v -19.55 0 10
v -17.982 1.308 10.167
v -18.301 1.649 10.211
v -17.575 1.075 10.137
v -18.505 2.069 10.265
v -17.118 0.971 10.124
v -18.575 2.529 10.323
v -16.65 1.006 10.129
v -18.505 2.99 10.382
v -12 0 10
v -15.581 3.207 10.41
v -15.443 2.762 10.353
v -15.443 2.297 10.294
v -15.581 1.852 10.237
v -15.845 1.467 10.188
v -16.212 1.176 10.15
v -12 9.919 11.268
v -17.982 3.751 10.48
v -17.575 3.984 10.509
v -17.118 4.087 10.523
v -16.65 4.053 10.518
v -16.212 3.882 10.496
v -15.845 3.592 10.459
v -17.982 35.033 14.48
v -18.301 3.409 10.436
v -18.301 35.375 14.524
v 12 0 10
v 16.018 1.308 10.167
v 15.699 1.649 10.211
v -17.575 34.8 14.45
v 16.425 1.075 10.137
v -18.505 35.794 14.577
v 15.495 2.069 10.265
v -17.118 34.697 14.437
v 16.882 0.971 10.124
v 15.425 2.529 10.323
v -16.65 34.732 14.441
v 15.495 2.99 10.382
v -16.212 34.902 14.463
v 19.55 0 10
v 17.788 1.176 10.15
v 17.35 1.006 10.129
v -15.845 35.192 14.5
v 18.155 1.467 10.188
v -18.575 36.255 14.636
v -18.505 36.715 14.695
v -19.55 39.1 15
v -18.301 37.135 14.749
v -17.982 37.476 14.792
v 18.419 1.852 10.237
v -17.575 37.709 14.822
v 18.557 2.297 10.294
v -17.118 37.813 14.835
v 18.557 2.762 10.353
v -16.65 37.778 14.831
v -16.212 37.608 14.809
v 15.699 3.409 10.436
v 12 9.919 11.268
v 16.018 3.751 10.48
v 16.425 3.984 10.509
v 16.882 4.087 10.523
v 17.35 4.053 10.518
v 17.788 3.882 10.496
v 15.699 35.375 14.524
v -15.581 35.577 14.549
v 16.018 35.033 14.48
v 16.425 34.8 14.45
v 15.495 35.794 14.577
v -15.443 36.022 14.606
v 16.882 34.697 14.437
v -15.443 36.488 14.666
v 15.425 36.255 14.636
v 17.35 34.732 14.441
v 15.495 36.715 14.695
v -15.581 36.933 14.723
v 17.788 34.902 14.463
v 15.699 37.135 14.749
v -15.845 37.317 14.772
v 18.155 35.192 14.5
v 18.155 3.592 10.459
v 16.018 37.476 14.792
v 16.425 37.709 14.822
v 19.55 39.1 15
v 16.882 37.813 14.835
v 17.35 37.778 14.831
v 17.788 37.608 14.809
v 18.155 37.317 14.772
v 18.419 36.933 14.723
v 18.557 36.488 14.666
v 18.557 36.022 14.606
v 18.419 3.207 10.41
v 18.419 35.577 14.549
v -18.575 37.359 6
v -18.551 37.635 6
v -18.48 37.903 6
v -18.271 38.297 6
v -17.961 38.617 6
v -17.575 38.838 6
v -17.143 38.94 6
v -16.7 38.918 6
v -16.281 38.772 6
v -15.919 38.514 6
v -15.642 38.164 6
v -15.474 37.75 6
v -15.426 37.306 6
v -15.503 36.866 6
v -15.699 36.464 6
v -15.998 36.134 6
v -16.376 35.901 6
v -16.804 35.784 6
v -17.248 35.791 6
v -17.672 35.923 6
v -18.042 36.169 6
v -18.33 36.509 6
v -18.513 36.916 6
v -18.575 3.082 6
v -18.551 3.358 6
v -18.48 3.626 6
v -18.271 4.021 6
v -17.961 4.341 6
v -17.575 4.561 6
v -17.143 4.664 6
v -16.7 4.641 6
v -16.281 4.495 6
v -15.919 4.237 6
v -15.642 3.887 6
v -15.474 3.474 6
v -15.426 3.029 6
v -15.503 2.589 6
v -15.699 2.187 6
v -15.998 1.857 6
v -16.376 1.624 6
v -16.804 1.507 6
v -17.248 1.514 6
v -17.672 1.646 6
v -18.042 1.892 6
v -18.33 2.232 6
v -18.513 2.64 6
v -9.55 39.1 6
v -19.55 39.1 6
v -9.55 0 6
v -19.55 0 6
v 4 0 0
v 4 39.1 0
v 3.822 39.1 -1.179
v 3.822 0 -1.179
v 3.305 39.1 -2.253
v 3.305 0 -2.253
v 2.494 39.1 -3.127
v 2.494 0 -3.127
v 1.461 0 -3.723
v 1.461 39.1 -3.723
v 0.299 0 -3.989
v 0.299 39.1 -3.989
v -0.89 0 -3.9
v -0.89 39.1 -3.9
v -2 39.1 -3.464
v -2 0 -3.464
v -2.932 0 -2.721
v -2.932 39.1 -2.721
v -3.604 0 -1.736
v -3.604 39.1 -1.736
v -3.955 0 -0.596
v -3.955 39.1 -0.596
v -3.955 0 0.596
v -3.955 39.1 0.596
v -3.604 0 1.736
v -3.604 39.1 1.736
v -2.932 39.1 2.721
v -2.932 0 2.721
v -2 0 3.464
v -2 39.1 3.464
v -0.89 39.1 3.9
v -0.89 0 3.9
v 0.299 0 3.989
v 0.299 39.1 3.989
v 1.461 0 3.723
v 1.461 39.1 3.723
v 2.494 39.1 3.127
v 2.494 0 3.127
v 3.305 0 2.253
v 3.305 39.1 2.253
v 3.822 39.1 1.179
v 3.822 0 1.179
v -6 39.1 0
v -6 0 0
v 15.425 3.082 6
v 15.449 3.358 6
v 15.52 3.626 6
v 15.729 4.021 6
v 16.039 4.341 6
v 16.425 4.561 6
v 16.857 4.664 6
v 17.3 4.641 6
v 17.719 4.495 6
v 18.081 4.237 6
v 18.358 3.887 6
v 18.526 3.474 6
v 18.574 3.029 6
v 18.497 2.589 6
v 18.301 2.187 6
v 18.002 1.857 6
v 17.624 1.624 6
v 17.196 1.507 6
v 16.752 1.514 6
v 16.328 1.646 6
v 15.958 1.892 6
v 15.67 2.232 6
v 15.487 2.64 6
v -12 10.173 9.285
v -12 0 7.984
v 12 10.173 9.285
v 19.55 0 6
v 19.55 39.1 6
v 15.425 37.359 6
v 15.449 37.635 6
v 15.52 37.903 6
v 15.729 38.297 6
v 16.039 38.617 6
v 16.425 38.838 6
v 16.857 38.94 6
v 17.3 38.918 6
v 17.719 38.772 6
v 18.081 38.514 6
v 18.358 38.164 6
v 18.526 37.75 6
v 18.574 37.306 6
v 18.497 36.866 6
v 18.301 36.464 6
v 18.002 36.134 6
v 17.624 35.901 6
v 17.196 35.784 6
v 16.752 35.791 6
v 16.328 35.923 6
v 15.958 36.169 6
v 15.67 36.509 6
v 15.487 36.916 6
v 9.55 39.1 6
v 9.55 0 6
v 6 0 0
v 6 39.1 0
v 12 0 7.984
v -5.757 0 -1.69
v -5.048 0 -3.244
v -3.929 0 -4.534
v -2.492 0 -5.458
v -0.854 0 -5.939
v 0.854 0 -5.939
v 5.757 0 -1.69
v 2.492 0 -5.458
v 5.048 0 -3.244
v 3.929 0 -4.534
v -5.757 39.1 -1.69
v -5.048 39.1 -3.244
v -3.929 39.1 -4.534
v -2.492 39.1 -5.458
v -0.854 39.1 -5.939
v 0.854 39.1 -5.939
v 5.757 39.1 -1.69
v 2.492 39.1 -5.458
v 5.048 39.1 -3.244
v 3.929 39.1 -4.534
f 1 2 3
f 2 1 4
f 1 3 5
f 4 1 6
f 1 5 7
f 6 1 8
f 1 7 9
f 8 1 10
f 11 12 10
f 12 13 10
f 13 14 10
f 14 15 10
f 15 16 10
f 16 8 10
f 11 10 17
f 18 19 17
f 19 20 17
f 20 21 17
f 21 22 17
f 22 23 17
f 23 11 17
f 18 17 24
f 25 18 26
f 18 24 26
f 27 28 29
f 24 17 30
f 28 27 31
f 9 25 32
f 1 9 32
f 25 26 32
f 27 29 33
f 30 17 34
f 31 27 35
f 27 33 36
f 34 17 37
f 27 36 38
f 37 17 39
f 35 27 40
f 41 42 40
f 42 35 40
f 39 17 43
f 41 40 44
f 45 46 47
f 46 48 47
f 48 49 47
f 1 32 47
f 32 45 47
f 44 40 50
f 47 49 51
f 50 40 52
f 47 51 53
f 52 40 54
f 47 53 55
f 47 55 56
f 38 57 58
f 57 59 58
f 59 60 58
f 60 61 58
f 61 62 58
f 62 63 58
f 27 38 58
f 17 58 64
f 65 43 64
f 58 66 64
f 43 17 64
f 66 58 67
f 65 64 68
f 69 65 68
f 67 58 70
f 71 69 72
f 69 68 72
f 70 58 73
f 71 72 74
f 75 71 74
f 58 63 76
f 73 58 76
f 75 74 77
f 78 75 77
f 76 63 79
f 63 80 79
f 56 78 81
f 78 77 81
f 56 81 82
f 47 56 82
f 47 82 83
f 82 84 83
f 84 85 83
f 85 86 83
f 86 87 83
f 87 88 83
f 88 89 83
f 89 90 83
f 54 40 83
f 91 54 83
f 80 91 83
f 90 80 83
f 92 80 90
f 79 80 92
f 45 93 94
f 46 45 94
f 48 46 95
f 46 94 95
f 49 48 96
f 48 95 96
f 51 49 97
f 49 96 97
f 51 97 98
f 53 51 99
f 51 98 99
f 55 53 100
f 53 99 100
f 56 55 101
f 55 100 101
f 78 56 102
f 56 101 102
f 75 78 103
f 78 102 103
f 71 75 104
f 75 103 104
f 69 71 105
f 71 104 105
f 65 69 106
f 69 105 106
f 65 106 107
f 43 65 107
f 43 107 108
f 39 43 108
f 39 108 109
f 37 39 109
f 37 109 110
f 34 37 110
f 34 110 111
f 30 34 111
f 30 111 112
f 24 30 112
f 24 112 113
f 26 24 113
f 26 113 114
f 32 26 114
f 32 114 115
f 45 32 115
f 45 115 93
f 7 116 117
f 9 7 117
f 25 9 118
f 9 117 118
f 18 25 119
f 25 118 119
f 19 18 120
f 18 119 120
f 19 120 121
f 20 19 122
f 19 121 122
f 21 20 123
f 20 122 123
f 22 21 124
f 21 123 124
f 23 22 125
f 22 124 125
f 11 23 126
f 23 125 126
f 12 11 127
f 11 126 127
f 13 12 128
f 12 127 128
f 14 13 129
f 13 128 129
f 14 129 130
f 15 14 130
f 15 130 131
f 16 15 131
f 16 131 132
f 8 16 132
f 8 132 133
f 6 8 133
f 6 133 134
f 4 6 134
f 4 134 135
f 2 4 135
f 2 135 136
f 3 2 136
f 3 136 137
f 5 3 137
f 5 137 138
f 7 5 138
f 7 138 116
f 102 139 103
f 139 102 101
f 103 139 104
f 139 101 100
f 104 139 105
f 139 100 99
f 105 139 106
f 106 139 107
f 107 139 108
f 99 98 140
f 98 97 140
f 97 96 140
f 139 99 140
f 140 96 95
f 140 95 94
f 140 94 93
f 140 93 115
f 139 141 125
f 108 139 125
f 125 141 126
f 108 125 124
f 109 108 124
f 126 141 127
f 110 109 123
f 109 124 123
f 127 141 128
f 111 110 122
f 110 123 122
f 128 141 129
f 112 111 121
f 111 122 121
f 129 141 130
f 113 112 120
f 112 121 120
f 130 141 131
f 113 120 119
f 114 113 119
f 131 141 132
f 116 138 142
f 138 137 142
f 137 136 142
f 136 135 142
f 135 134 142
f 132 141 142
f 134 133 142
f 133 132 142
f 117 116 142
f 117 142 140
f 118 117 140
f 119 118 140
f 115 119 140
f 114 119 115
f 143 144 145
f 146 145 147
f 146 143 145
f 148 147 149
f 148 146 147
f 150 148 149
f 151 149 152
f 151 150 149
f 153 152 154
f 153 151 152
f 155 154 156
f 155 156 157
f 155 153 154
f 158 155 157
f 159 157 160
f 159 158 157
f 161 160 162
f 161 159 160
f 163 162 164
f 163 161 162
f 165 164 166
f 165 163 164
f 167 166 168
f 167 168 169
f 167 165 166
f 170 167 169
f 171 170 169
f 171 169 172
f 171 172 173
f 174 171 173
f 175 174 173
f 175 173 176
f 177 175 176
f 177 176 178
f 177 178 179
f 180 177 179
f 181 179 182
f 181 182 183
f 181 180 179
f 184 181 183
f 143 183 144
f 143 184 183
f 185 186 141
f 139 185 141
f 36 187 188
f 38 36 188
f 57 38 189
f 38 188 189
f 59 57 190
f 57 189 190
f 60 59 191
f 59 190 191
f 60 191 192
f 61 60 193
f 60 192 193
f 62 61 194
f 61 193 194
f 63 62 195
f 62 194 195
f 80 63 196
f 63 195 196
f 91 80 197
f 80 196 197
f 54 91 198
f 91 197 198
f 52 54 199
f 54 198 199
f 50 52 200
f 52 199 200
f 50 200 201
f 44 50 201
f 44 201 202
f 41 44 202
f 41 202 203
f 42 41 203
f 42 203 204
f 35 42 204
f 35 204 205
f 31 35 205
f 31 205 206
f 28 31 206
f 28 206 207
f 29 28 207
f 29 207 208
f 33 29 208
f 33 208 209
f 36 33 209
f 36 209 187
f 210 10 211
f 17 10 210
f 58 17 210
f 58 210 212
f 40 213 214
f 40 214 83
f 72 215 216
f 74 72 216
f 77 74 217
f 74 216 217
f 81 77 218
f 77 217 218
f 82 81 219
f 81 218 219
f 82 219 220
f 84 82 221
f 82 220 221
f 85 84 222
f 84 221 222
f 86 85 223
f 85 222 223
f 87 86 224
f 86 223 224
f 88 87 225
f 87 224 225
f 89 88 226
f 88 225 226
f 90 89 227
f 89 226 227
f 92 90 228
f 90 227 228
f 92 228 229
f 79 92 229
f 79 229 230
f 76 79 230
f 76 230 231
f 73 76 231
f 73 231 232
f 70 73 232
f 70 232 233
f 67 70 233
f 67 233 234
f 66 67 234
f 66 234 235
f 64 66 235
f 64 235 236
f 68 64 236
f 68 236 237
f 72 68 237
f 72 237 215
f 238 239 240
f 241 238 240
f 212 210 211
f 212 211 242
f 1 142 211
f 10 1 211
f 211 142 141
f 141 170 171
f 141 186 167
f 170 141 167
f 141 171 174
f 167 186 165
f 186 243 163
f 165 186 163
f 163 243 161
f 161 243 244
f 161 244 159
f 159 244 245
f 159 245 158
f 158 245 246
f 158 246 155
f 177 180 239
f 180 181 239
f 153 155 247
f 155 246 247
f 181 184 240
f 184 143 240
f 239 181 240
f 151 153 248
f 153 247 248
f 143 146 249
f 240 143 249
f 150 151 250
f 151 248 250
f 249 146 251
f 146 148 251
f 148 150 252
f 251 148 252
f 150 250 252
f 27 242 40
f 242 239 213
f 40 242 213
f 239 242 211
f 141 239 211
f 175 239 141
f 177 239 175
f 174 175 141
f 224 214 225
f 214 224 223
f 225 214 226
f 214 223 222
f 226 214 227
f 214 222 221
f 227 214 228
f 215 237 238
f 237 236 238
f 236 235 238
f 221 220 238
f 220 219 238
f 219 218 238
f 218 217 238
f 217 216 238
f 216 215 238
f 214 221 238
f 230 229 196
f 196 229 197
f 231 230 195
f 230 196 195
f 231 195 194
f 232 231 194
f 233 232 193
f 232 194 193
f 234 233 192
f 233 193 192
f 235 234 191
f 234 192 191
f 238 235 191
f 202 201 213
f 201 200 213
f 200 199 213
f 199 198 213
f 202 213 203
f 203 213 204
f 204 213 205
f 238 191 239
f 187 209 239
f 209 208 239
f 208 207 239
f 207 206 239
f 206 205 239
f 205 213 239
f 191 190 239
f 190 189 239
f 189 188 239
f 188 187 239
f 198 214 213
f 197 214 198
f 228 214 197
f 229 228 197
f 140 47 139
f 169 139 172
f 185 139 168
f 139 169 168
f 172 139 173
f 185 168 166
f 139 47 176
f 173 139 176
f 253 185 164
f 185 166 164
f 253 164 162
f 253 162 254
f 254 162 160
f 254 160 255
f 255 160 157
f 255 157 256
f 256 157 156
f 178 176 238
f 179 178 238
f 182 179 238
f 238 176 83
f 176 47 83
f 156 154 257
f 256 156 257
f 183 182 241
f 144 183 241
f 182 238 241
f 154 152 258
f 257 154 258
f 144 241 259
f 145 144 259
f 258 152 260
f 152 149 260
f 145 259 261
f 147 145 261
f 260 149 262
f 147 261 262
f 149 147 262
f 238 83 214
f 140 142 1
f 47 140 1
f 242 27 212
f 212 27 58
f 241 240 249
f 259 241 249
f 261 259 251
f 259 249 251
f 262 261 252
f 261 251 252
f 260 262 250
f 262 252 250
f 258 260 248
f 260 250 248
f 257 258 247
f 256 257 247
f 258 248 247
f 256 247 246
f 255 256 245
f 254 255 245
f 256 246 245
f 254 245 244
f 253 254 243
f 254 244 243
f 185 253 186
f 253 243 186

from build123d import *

# Parameters (mm, degrees)
SKETCH_1_R                  = 4
EXTRUDE_1_DEPTH             = 39.1
EXTRUDE_2_DEPTH             = 39.1
HOLE_WIZARD_M32_D           = 3.15
PATTERN_LINEAR_2_COUNT      = 2
PATTERN_LINEAR_2_PITCH      = 34
PATTERN_LINEAR_2_COUNT_DIR2 = 2
PATTERN_LINEAR_2_PITCH_DIR2 = 34
SKETCH_10_W                 = 24
SKETCH_10_H                 = 12
CUT_EXTRUDE_2_DEPTH         = 2


with BuildPart() as part:
    # Эскиз1 → Бобышка-Вытянуть1 (new body)
    with BuildSketch(Plane(origin=(0, 0, 0), x_dir=(1, 0, 0), z_dir=(0, 1, 0))):
        with BuildLine():
            Line((-19.55, -10), (19.55, -10))
            Line((19.55, -10), (19.55, -6))
            Line((19.55, -6), (9.55, -6))
            Line((9.55, -6), (6, 0))
            ThreePointArc((6, 0), (0, 6), (-6, 0))
            Line((-6, 0), (-9.55, -6))
            Line((-9.55, -6), (-19.55, -6))
            Line((-19.55, -6), (-19.55, -10))
        make_face()
        Circle(SKETCH_1_R, mode=Mode.SUBTRACT)
    extrude(amount=EXTRUDE_1_DEPTH)

    # Эскиз5 → Бобышка-Вытянуть2 (add)
    with BuildSketch(Plane(origin=(19.55, 0, 0), x_dir=(0, 0, -1), z_dir=(1, 0, 0))):
        Polygon((-10, 0), (-15, 39.1), (-10, 39.1), align=None)
    extrude(amount=-EXTRUDE_2_DEPTH)

    # Сверло под метчик  спиральное M32 (through all)
    with Locations(Plane(origin=(0, -1.258197592, 9.839105167), x_dir=(1, 0, 0), z_dir=(0, -0.126844327, 0.991922636))):
        with Locations((-17, 3.818443269)):
            hole_wizard_m32 = Hole(HOLE_WIZARD_M32_D / 2)

    # Линейный массив2: Hole Wizard M32 2 × 2
    with Locations(*[Vector(1, 0, 0) * (i * PATTERN_LINEAR_2_PITCH) + Vector(0, 0.991922636, 0.126844327) * (j * PATTERN_LINEAR_2_PITCH_DIR2) for i in range(PATTERN_LINEAR_2_COUNT) for j in range(PATTERN_LINEAR_2_COUNT_DIR2) if (i, j) != (0, 0)]):
        add(hole_wizard_m32, mode=Mode.SUBTRACT)

    # Эскиз10 → Вырез-Вытянуть2 (cut)
    with BuildSketch(Plane(origin=(0, -1.258197592, 9.839105167), x_dir=(1, 0, 0), z_dir=(0, -0.126844327, 0.991922636))):
        with Locations((0, 5.268443269)):
            Rectangle(SKETCH_10_W, SKETCH_10_H)
    extrude(amount=-CUT_EXTRUDE_2_DEPTH, mode=Mode.SUBTRACT)


solid = part.part
